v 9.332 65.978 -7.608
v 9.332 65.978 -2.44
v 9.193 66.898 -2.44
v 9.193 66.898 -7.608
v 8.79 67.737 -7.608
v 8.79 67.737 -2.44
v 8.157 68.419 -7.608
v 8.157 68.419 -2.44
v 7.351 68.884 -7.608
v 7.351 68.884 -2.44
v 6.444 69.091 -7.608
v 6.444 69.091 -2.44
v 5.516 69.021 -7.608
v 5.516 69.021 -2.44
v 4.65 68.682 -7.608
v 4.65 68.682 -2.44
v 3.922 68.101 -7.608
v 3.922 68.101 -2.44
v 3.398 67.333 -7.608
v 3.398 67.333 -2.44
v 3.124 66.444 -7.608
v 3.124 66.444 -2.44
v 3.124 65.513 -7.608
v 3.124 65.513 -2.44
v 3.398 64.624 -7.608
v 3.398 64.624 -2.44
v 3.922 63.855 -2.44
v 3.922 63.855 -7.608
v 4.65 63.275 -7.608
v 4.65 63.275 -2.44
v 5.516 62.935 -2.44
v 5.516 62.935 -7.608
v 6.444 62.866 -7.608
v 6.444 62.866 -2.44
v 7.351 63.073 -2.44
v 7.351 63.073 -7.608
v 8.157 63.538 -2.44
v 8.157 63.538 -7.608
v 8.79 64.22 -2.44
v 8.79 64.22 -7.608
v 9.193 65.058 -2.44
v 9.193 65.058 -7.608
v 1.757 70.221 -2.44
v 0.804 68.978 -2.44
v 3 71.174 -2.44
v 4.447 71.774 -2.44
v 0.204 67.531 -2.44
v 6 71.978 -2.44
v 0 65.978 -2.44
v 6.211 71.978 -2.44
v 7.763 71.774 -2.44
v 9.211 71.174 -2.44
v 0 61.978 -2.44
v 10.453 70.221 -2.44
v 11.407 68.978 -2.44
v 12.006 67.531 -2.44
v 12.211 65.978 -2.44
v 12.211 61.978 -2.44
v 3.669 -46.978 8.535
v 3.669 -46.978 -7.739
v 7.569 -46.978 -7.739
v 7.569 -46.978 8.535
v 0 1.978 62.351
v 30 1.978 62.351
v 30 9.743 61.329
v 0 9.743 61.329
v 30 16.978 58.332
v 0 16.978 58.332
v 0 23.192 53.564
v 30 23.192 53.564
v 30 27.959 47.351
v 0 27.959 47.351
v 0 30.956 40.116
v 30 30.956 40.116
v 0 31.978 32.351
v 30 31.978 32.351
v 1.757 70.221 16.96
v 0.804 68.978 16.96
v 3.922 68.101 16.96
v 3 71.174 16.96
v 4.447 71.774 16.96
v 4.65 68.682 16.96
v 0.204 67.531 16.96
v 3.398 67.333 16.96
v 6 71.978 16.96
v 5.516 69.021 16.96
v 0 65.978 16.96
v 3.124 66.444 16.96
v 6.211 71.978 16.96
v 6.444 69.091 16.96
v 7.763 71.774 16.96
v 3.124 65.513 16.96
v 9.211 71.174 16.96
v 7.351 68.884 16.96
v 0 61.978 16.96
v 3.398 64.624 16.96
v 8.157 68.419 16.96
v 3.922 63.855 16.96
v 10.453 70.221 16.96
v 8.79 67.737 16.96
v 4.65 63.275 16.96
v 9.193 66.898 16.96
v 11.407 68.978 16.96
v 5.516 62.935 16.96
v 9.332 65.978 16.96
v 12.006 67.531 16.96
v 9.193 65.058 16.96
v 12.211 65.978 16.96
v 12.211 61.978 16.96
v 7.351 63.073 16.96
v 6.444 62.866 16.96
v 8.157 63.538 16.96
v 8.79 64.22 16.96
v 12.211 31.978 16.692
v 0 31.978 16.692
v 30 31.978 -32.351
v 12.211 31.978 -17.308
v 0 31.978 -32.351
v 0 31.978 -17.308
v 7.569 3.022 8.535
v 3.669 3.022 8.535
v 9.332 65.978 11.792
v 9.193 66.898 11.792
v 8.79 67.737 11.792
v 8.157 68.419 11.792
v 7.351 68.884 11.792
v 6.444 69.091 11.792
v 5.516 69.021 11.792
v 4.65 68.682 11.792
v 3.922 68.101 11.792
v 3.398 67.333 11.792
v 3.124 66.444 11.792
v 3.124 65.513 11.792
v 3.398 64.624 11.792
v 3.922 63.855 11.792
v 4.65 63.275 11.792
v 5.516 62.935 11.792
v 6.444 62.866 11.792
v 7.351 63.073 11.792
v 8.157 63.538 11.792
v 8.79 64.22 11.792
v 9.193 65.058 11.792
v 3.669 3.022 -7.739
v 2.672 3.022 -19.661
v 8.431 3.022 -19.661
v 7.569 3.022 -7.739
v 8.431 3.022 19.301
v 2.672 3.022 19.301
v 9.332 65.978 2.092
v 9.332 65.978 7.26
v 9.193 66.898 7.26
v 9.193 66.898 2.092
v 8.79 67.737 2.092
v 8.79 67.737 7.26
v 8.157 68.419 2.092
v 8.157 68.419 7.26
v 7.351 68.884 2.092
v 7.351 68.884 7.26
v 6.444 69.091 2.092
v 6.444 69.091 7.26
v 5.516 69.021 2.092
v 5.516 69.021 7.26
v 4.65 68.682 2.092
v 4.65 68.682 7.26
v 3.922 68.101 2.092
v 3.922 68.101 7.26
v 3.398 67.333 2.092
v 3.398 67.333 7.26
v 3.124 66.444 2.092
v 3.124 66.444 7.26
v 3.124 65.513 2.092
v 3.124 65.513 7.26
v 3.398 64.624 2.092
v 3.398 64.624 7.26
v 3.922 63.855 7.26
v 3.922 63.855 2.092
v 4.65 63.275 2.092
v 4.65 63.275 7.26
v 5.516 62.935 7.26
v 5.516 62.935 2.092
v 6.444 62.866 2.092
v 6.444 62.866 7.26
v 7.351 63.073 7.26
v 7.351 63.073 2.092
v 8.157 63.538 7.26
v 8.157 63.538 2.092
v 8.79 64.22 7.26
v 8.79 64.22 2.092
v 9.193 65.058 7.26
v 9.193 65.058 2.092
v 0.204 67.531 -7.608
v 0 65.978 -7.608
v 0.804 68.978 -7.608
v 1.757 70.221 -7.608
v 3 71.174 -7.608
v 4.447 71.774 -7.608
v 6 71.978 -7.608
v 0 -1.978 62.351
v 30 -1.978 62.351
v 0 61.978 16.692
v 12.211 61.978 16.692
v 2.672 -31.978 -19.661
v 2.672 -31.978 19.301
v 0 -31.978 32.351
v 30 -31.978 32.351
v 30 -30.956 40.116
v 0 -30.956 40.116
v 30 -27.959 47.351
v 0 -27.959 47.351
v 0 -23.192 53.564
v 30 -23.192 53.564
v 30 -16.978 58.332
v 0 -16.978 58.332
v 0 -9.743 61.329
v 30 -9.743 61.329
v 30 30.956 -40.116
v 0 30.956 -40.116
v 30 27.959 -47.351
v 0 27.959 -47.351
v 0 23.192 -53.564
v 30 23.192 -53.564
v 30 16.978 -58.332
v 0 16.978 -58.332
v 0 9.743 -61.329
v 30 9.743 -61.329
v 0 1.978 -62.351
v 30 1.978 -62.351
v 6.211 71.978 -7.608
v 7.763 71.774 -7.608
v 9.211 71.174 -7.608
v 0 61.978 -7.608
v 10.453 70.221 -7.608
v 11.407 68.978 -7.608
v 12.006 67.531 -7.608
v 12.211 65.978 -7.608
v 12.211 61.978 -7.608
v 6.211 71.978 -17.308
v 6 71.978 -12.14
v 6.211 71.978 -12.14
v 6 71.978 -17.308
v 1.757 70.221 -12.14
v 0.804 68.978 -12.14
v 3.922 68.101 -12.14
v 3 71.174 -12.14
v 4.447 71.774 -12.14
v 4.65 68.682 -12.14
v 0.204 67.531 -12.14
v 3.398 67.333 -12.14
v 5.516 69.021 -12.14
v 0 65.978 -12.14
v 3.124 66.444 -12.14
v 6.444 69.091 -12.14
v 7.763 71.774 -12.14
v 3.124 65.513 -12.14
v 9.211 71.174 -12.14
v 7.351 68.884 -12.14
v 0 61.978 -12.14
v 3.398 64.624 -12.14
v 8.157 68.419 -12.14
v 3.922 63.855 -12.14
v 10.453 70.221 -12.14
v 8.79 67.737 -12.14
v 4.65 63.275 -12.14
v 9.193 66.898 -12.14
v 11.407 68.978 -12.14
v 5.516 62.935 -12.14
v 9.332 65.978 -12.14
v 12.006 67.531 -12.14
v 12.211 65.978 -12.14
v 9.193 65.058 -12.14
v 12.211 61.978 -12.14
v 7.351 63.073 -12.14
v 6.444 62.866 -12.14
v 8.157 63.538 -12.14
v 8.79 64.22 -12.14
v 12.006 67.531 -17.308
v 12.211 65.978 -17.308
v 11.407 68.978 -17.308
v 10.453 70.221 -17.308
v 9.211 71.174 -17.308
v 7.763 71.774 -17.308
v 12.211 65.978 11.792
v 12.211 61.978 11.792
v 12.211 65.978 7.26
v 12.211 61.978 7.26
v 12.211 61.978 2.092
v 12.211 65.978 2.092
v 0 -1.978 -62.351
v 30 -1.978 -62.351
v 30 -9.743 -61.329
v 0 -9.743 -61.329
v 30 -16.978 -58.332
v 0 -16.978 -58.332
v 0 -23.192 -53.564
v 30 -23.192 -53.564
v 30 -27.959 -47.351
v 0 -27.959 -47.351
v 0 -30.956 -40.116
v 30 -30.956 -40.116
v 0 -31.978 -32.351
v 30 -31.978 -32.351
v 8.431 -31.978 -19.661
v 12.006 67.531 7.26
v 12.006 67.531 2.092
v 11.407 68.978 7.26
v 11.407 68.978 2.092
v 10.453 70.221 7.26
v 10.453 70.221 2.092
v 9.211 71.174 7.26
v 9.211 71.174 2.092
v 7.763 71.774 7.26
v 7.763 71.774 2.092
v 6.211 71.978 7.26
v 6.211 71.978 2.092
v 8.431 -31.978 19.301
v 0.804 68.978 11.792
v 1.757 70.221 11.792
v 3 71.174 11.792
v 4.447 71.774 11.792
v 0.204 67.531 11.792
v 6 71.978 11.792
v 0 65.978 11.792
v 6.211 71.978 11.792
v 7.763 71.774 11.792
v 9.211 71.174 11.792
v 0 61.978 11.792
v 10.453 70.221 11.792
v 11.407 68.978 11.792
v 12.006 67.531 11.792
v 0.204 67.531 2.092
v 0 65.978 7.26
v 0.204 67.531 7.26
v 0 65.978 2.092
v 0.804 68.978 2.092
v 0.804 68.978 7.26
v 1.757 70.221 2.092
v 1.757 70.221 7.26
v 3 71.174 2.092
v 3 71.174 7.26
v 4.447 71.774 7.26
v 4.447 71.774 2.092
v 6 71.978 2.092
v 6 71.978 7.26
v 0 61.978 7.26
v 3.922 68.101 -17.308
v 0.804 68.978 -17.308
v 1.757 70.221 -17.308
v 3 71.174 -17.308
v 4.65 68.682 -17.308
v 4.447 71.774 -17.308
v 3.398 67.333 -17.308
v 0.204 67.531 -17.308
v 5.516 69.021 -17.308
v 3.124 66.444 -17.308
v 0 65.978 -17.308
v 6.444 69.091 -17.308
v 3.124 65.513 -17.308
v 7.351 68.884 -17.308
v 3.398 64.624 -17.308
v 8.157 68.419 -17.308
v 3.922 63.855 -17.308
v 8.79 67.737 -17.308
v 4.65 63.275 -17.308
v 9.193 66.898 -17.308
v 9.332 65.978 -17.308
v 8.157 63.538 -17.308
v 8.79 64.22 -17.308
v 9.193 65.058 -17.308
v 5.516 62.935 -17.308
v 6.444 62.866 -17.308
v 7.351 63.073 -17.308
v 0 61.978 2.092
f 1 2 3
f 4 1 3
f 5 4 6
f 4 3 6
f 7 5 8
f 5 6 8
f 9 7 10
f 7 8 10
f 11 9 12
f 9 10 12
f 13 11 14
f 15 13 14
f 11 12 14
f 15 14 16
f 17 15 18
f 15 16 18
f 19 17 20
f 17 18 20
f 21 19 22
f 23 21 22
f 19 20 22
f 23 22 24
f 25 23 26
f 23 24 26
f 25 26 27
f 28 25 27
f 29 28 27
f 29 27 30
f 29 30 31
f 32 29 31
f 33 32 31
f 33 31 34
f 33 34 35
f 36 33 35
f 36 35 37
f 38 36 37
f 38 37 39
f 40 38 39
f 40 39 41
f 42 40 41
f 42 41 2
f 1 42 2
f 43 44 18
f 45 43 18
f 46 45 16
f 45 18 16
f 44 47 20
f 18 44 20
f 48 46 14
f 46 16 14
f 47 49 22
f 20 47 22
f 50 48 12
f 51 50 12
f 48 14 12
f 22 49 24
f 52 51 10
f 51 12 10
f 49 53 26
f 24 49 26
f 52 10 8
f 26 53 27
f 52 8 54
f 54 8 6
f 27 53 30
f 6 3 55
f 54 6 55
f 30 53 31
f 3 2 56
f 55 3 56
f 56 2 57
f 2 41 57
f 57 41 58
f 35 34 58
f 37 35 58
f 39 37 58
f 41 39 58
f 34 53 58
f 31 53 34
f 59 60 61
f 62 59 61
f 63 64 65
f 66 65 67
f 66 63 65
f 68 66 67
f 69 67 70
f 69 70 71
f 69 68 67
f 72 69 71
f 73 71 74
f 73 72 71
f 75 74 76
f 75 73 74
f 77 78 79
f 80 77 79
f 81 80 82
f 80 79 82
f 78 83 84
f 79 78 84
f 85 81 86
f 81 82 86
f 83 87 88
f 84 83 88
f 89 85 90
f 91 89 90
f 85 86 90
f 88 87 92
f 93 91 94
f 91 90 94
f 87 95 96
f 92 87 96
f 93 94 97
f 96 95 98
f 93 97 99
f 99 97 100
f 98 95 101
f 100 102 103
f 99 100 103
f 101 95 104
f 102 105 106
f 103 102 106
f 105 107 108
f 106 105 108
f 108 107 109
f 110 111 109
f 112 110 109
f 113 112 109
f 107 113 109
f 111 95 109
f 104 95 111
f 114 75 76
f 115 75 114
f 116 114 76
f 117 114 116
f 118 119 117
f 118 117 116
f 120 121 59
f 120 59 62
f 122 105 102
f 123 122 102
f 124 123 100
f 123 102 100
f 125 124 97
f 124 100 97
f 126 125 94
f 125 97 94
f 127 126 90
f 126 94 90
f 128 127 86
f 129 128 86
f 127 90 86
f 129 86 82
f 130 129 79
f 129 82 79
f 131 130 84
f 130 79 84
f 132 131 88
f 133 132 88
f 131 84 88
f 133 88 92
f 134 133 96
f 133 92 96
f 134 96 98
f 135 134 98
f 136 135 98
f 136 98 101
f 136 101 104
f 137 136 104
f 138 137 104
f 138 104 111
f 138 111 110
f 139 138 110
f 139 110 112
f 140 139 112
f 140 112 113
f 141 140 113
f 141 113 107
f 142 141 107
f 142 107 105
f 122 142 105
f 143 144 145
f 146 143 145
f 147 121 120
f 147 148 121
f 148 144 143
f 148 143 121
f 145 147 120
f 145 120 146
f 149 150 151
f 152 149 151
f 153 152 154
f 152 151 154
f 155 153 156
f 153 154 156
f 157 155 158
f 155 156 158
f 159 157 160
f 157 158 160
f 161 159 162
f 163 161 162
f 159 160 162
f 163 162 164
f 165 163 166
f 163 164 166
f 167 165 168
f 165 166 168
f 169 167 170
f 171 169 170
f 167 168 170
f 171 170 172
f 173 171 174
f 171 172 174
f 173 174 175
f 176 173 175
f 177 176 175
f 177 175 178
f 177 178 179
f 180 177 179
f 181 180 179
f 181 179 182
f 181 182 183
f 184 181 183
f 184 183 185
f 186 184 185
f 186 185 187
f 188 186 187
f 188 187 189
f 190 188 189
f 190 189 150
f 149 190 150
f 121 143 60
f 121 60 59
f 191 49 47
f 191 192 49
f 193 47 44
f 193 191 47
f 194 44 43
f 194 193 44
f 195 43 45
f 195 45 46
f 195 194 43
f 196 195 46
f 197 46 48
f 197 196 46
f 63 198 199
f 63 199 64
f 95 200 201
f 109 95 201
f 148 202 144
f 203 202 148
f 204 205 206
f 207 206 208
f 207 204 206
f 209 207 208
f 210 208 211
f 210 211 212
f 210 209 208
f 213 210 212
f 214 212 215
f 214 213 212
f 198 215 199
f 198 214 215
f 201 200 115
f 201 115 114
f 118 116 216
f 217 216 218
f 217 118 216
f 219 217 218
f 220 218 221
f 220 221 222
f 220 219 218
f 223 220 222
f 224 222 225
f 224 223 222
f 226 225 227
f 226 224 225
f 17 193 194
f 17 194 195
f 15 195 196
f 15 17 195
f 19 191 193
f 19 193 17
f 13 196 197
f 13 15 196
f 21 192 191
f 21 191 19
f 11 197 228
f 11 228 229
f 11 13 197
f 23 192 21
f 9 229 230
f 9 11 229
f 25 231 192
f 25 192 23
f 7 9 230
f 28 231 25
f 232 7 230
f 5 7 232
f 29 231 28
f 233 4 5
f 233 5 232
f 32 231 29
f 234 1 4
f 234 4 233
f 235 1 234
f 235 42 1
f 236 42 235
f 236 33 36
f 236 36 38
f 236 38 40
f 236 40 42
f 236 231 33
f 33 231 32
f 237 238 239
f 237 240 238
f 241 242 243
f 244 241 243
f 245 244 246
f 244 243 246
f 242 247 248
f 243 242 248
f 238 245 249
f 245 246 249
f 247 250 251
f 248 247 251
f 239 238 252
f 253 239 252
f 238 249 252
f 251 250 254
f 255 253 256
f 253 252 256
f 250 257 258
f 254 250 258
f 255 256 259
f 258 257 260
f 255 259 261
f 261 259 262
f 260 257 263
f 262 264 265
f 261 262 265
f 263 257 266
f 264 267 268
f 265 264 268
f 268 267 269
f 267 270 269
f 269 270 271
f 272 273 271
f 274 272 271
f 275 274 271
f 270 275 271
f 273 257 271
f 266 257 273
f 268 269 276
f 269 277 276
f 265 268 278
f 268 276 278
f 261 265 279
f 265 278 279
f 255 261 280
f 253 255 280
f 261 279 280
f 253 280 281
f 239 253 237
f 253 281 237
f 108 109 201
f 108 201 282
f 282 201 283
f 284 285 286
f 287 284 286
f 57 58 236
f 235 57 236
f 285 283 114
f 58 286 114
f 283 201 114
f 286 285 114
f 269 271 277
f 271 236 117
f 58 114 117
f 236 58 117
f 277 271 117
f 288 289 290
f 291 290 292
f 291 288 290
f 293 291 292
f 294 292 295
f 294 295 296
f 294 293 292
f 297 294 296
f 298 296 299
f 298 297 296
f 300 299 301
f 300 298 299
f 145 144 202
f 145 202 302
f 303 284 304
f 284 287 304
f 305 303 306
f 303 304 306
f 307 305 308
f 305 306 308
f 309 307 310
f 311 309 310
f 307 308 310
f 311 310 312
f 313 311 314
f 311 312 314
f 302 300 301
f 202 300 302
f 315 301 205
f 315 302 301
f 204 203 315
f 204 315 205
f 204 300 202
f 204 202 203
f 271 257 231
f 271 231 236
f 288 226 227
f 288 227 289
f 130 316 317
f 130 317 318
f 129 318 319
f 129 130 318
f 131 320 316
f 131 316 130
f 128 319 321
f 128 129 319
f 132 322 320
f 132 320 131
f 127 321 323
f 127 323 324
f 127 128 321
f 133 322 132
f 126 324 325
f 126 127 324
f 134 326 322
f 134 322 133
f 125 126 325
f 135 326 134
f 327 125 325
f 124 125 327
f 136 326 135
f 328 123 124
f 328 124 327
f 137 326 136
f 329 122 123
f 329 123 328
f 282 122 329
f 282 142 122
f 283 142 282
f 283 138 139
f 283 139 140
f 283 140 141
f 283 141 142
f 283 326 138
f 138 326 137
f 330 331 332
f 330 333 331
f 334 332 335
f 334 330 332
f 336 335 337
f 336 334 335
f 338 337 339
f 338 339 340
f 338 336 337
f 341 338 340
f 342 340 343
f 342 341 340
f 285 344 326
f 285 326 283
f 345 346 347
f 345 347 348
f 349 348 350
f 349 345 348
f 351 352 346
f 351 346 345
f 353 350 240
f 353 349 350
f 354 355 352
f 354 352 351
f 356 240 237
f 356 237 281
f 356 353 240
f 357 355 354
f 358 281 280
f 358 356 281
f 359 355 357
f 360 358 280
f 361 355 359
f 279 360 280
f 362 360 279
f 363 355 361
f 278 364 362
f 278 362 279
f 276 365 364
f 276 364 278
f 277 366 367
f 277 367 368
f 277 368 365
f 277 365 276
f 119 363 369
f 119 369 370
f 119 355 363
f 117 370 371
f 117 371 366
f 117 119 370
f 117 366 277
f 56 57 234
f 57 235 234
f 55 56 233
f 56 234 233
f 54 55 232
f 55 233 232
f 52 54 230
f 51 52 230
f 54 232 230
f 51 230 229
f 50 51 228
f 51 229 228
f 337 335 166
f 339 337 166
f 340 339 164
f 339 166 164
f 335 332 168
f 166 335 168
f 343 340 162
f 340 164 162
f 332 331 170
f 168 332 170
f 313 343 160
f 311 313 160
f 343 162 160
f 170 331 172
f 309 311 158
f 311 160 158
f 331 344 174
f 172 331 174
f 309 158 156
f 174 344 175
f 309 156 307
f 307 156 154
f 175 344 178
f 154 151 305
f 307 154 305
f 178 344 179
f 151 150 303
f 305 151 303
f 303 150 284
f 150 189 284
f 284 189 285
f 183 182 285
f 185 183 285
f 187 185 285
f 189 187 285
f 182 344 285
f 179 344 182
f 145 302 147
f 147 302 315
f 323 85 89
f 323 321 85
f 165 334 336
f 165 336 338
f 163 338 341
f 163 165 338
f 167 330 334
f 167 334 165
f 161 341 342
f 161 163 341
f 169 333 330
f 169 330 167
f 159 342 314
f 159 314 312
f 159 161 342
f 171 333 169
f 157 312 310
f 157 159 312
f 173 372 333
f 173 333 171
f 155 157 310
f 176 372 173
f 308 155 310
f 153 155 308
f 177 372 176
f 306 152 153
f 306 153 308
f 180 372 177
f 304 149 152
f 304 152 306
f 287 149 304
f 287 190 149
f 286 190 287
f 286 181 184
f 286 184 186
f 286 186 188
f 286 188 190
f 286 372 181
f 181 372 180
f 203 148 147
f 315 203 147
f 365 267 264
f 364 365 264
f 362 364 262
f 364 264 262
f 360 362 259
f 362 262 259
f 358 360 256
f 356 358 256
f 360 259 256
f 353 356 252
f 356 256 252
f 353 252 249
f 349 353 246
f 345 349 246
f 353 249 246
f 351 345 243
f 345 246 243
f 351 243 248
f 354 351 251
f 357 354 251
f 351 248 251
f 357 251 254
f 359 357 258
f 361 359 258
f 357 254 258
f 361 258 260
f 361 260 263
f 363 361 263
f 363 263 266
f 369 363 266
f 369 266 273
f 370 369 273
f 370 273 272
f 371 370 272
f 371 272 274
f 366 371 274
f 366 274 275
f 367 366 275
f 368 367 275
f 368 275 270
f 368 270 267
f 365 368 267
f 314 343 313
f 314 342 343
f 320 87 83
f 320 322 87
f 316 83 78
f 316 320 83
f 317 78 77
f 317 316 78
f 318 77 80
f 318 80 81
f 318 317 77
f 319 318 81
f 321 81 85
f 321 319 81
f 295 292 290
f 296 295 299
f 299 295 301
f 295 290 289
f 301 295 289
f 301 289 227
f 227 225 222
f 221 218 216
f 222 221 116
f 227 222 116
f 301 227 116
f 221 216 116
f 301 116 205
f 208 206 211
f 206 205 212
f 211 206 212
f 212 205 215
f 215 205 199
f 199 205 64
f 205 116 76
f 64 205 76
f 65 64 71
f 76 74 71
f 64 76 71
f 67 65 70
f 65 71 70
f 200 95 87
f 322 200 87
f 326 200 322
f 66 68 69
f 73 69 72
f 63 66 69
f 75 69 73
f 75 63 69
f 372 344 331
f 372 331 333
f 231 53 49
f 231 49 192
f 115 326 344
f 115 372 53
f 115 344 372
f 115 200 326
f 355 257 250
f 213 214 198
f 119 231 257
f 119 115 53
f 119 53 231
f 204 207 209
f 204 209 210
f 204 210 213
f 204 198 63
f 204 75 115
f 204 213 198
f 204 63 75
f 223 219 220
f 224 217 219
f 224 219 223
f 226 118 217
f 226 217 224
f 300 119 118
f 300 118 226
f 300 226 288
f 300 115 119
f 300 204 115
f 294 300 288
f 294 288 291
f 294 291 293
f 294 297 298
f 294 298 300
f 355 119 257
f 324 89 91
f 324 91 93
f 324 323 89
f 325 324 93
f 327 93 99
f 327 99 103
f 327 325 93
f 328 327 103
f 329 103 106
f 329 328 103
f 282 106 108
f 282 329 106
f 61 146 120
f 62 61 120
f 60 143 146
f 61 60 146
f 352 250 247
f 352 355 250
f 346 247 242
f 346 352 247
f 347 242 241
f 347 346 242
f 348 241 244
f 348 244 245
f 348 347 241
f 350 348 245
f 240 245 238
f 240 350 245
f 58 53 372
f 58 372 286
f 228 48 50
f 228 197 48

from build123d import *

# Parameters (mm, degrees)
BOSS_EXTRUDE1_DEPTH    = 30
SKETCH4_W              = 12.210528057
SKETCH4_H              = 34
BOSS_EXTRUDE3_DEPTH    = 30
SKETCH5_W              = 12.210528057
SKETCH5_H              = 5.168070784
BOSS_EXTRUDE4_DEPTH    = 10
FILLET1_R              = 6
LPATTERN1_COUNT        = 4
LPATTERN1_PITCH        = 9.7
FILLET1_OF_LPATTERN1_R = 6
SKETCH6_R              = 3.121394117
CUT_EXTRUDE1_DEPTH     = 80.311190797
SKETCH10_W             = 5.758909818
SKETCH10_H             = 38.962624233
CUT_EXTRUDE2_DEPTH     = 35
SKETCH11_W             = 3.89943497
SKETCH11_H             = 16.273957598
BOSS_EXTRUDE5_DEPTH    = 50


with BuildPart() as part:
    # Sketch1 → Boss-Extrude1 (new body)
    with BuildSketch(Plane(origin=(0, 0, 0), x_dir=(0, 0, -1), z_dir=(1, 0, 0))):
        with BuildLine():
            Line((-32.351279839, 31.978308301), (32.351279839, 31.978308301))
            ThreePointArc((32.351279839, 31.978308301), (53.564483275, 23.191511736), (62.351279839, 1.978308301))
            Line((62.351279839, 1.978308301), (62.351279839, -1.978308301))
            ThreePointArc((62.351279839, -1.978308301), (53.564483275, -23.191511736), (32.351279839, -31.978308301))
            Line((32.351279839, -31.978308301), (-32.351279839, -31.978308301))
            ThreePointArc((-32.351279839, -31.978308301), (-53.564483275, -23.191511736), (-62.351279839, -1.978308301))
            Line((-62.351279839, -1.978308301), (-62.351279839, 1.978308301))
            ThreePointArc((-62.351279839, 1.978308301), (-53.564483275, 23.191511736), (-32.351279839, 31.978308301))
        make_face()
    extrude(amount=BOSS_EXTRUDE1_DEPTH)

    # Sketch4 → Boss-Extrude3 (add)
    with BuildSketch(Plane(origin=(0, 31.978308301, 0), x_dir=(1, 0, 0), z_dir=(0, 1, 0))):
        with Locations((6.105264029, 0.308159826)):
            Rectangle(SKETCH4_W, SKETCH4_H)
    extrude(amount=BOSS_EXTRUDE3_DEPTH)

    # Sketch5 → Boss-Extrude4 (add)
    with BuildSketch(Plane(origin=(0, 61.978308301, 0), x_dir=(1, 0, 0), z_dir=(0, 1, 0))):
        with Locations((6.105264029, 14.724124434)):
            Rectangle(SKETCH5_W, SKETCH5_H)
    boss_extrude4 = extrude(amount=BOSS_EXTRUDE4_DEPTH)

    # Fillet1
    fillet1_edges = [part.edges().sort_by_distance(p)[0] for p in [
        (0, 71.978308301, -14.724124434),
        (12.210528057, 71.978308301, -14.724124434),
    ]]
    fillet(fillet1_edges, radius=FILLET1_R)

    # LPattern1: Boss-Extrude4 ×4
    with Locations(*[(0, 0, i * LPATTERN1_PITCH) for i in range(1, LPATTERN1_COUNT)]):
        add(boss_extrude4)

    # Fillet1 of LPattern1
    fillet1_of_lpattern1_edges = [part.edges().sort_by_distance(p)[0] for p in [
        (0, 71.978308301, -5.024124434),
        (12.210528057, 71.978308301, -5.024124434),
        (0, 71.978308301, 4.675875566),
        (12.210528057, 71.978308301, 4.675875566),
        (0, 71.978308301, 14.375875566),
        (12.210528057, 71.978308301, 14.375875566),
    ]]
    fillet(fillet1_of_lpattern1_edges, radius=FILLET1_OF_LPATTERN1_R)

    # Sketch6 → Cut-Extrude1 (cut, through all)
    with BuildSketch(Plane.XY.offset(16.959910958)):
        with Locations((6.210528057, 65.978308301)):
            Circle(SKETCH6_R)
    extrude(amount=-CUT_EXTRUDE1_DEPTH, mode=Mode.SUBTRACT)

    # Sketch10 → Cut-Extrude2 (cut)
    with BuildSketch(Plane.XZ.offset(31.978308301)):
        with Locations((5.551788581, -0.179965931)):
            Rectangle(SKETCH10_W, SKETCH10_H)
    extrude(amount=-CUT_EXTRUDE2_DEPTH, mode=Mode.SUBTRACT)

    # Sketch11 → Boss-Extrude5 (add)
    with BuildSketch(Plane.XZ.offset(-3.021691699)):
        with Locations((5.619023304, 0.398013913)):
            Rectangle(SKETCH11_W, SKETCH11_H)
    extrude(amount=BOSS_EXTRUDE5_DEPTH)


solid = part.part
